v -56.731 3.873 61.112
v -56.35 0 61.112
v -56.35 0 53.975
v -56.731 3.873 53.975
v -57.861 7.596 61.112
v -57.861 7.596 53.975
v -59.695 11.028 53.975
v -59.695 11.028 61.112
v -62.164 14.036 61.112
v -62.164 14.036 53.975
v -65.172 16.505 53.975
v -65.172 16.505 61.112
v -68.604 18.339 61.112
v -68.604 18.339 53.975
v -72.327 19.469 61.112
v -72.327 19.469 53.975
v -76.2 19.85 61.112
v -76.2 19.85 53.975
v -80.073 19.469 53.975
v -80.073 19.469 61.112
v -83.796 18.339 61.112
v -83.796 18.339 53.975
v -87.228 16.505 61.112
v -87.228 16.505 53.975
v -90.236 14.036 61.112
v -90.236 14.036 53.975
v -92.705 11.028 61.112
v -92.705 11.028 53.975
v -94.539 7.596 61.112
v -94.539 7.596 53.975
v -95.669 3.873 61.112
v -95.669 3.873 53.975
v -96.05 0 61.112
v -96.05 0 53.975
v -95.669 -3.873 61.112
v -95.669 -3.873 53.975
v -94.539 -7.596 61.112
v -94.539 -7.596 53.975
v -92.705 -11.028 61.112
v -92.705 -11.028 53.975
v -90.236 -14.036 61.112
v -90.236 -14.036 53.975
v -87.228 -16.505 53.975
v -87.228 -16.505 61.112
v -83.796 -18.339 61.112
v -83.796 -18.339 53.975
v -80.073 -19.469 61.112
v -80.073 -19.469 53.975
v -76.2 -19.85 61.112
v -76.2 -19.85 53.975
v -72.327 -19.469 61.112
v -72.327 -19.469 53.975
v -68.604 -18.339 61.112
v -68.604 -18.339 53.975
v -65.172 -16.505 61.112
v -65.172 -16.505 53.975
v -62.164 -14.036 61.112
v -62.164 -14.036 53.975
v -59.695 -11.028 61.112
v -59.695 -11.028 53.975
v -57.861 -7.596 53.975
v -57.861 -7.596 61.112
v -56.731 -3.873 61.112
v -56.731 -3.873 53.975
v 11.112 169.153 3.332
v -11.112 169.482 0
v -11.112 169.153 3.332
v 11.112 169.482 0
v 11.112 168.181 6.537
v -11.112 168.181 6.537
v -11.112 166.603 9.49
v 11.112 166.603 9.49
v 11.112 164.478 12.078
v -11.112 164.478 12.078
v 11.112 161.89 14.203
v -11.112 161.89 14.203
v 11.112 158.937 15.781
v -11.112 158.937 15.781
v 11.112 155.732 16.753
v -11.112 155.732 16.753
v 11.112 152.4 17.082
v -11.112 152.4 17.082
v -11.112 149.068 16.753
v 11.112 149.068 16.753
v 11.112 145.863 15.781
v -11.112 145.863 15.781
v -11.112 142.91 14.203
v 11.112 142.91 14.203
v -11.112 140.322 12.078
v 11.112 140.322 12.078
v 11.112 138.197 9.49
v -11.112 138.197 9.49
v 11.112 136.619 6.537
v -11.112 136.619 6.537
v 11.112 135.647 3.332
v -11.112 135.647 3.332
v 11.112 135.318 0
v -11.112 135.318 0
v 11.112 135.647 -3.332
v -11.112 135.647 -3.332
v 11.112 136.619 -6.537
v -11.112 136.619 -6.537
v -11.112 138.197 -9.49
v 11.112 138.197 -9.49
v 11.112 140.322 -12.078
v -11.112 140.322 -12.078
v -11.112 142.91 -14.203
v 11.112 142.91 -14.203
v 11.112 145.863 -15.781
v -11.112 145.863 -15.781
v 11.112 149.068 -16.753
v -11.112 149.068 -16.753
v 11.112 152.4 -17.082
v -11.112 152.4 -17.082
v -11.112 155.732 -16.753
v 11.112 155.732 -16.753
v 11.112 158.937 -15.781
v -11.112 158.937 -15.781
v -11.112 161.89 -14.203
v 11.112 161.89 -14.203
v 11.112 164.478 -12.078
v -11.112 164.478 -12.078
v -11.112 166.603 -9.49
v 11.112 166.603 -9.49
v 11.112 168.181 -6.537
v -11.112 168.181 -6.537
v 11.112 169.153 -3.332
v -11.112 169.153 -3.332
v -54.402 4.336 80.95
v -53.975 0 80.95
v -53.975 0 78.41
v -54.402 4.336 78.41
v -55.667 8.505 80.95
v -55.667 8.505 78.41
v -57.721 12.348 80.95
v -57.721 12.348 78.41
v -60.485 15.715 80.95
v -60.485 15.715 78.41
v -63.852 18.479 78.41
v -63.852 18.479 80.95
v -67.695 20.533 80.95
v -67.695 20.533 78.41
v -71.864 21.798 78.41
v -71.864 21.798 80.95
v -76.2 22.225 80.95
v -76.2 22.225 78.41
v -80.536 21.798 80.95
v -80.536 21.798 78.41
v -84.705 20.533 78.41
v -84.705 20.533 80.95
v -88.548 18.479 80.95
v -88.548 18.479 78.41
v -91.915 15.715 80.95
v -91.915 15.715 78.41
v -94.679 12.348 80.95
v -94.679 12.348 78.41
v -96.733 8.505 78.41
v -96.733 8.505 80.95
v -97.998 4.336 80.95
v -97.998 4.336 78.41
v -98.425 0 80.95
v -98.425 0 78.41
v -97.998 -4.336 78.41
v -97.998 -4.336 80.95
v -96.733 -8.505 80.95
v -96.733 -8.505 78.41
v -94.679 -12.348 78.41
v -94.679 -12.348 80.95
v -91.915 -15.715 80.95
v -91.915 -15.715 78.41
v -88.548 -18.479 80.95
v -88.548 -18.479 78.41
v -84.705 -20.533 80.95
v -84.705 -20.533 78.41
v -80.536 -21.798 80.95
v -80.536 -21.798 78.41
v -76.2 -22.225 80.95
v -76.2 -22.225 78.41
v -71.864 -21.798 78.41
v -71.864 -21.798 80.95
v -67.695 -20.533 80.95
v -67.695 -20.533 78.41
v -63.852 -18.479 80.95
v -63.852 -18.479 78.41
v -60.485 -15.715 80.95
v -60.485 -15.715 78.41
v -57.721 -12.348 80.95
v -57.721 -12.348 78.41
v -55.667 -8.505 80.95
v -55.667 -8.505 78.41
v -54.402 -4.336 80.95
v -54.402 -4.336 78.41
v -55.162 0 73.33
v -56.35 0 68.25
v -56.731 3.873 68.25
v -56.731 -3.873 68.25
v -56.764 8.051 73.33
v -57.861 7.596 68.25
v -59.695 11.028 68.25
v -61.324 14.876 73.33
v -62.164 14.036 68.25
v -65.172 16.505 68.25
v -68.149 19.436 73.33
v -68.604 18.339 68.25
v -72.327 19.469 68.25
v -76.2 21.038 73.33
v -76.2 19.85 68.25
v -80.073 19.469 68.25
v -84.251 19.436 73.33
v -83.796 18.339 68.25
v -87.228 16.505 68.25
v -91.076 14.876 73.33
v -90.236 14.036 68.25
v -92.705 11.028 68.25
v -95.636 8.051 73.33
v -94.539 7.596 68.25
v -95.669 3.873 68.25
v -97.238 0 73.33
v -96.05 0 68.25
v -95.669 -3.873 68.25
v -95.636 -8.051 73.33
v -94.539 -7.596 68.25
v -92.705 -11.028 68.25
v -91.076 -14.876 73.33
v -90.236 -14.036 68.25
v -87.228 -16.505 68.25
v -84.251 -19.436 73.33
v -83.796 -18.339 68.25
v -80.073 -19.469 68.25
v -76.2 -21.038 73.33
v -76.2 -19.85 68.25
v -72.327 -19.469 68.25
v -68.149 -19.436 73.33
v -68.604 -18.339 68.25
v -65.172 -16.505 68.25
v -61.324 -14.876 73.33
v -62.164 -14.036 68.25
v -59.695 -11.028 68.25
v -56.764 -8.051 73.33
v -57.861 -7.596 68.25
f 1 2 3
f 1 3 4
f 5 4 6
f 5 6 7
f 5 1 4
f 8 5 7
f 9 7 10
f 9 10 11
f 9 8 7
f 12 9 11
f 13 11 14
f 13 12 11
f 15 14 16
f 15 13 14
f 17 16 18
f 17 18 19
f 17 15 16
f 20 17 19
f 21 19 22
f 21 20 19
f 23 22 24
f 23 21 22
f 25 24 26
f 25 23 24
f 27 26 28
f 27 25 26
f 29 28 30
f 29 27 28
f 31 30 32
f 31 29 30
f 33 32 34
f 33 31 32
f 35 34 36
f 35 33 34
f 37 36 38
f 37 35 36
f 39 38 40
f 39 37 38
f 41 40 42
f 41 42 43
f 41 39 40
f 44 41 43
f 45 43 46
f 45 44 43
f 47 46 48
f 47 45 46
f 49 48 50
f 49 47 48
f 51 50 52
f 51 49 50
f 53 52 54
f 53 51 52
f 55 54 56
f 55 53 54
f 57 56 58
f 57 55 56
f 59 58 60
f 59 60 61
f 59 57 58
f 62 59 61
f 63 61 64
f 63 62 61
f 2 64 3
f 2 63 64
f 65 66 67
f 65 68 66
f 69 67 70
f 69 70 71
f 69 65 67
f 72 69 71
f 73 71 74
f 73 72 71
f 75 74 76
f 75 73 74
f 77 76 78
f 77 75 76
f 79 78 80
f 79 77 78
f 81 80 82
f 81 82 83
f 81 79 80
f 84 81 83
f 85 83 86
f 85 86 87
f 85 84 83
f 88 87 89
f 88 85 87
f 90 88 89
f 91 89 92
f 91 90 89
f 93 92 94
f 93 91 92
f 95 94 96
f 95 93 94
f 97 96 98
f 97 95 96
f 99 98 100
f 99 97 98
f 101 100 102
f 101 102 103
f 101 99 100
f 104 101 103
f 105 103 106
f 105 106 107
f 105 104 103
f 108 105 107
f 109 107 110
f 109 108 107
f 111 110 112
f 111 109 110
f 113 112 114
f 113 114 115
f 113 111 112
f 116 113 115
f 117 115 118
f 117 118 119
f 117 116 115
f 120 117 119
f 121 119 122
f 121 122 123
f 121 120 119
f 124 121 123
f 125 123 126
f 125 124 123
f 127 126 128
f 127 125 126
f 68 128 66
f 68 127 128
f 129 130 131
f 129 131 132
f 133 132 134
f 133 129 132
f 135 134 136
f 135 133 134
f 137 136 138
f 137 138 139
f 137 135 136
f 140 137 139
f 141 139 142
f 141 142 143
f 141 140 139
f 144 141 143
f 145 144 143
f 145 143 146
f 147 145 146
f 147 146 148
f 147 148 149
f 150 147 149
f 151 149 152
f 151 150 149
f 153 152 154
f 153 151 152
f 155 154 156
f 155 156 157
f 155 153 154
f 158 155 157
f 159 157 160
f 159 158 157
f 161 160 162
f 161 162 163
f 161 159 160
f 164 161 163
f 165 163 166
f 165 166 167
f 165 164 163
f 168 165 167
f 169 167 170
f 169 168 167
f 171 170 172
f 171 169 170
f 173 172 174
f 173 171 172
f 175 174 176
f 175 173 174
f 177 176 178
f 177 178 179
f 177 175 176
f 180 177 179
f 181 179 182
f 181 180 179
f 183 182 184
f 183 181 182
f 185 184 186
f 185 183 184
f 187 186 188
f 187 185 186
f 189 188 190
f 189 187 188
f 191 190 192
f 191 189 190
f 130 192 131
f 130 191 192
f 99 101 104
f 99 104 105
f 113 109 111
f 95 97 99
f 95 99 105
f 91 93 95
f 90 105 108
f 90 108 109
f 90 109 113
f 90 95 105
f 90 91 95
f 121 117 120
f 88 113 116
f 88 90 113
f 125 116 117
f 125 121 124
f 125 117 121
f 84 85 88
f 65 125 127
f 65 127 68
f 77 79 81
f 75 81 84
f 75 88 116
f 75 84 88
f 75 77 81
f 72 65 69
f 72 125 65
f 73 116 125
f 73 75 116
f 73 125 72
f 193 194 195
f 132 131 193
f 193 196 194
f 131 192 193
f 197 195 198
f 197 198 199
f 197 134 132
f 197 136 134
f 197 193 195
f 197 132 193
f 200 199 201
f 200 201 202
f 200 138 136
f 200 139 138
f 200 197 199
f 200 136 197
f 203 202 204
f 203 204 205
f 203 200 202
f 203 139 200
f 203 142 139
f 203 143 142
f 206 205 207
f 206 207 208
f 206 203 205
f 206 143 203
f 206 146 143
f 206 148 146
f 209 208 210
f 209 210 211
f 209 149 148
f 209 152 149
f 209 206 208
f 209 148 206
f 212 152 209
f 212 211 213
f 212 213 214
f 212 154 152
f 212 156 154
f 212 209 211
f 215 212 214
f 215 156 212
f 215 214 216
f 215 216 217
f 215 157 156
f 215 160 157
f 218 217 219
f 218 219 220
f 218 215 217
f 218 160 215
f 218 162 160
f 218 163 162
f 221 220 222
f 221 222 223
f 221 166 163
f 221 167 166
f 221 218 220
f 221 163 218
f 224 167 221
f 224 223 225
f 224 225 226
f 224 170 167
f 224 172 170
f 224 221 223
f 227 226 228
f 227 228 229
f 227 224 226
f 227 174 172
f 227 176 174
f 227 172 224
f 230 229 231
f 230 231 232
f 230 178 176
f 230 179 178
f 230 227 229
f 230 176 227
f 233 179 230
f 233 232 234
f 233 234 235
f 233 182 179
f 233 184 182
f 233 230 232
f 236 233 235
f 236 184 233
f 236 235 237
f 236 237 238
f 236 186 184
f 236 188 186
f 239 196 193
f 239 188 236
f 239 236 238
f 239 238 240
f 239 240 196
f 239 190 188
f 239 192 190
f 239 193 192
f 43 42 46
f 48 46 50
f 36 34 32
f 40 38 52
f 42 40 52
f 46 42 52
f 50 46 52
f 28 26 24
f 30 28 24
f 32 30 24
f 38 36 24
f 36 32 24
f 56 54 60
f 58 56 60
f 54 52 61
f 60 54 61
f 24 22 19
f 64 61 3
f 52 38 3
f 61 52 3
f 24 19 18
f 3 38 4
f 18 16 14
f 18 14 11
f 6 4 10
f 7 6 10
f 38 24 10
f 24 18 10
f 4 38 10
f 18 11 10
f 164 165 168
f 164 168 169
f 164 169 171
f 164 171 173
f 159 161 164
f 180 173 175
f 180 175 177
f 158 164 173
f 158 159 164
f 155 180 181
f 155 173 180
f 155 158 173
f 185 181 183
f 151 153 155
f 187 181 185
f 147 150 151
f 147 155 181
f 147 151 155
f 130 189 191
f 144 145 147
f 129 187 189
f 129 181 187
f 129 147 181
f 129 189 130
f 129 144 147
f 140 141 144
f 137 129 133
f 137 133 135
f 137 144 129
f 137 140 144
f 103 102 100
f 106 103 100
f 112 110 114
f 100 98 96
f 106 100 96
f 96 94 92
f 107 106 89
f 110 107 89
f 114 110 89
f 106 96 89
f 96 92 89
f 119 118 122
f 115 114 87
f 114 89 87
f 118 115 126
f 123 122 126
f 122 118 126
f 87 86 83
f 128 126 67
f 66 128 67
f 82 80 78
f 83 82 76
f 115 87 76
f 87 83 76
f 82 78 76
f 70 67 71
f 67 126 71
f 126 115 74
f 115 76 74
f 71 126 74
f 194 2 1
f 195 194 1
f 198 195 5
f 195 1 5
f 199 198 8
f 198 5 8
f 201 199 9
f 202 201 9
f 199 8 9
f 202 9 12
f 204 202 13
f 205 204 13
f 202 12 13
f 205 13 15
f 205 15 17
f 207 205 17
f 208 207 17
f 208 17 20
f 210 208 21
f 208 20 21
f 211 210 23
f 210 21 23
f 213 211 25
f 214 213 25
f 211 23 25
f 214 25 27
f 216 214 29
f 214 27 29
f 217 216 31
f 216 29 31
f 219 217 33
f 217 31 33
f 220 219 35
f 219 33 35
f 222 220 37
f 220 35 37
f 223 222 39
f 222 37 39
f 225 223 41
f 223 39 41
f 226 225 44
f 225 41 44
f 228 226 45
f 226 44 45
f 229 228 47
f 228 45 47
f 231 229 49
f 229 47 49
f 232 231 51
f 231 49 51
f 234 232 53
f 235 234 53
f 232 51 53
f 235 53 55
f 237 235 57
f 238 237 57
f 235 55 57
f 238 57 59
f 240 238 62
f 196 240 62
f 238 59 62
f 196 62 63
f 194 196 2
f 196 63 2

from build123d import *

# Parameters (mm, degrees)
F2_R          = 19.8501
F3_DEPTH      = 7.1374
F3_DEPTH_BACK = 7.1374
F5_R          = 22.225
F6_DEPTH      = 2.54
F3_FACE_R     = 19.8501
F6_FACE_R     = 22.225
F8_R          = 17.0815
F9_DEPTH      = 11.1125
F9_DEPTH_BACK = 11.1125


with BuildPart() as f3:
    # F2 (on offset) → F3 (new body, two sides)
    with BuildSketch(Plane.XY.offset(61.1124)) as f3_sk:
        with Locations((-76.2, 0)):
            Circle(F2_R)
    extrude(amount=-F3_DEPTH)
    extrude(f3_sk.sketch, amount=F3_DEPTH_BACK)



with BuildPart() as f6:
    # F5 (on offset) → F6 (new body)
    with BuildSketch(Plane.XY.offset(80.9498)):
        with Locations((-76.2, 0)):
            Circle(F5_R)
    extrude(amount=-F6_DEPTH)


with BuildPart() as f3_1:
    add(f3.part)

    add(f6.part)  # F7 merges F6
    # F3_face (on face) → F7 section 0
    with BuildSketch(Plane(origin=(-76.2, 0, 68.2498), x_dir=(1, 0, 0), z_dir=(0, 0, 1))):
        Circle(F3_FACE_R)
    # F6_face (on face) → F7 section 1
    with BuildSketch(Plane(origin=(-76.2, 0, 78.4098), x_dir=(1, 0, 0), z_dir=(0, 0, -1))):
        Circle(F6_FACE_R)
    loft()


with BuildPart() as f9:
    # F8 (on Right) → F9 (new body, two sides)
    with BuildSketch(Plane.YZ) as f9_sk:
        with Locations((152.4, 0)):
            Circle(F8_R)
    extrude(amount=F9_DEPTH)
    extrude(f9_sk.sketch, amount=-F9_DEPTH_BACK)


solid = Compound([f3_1.part, f9.part])
